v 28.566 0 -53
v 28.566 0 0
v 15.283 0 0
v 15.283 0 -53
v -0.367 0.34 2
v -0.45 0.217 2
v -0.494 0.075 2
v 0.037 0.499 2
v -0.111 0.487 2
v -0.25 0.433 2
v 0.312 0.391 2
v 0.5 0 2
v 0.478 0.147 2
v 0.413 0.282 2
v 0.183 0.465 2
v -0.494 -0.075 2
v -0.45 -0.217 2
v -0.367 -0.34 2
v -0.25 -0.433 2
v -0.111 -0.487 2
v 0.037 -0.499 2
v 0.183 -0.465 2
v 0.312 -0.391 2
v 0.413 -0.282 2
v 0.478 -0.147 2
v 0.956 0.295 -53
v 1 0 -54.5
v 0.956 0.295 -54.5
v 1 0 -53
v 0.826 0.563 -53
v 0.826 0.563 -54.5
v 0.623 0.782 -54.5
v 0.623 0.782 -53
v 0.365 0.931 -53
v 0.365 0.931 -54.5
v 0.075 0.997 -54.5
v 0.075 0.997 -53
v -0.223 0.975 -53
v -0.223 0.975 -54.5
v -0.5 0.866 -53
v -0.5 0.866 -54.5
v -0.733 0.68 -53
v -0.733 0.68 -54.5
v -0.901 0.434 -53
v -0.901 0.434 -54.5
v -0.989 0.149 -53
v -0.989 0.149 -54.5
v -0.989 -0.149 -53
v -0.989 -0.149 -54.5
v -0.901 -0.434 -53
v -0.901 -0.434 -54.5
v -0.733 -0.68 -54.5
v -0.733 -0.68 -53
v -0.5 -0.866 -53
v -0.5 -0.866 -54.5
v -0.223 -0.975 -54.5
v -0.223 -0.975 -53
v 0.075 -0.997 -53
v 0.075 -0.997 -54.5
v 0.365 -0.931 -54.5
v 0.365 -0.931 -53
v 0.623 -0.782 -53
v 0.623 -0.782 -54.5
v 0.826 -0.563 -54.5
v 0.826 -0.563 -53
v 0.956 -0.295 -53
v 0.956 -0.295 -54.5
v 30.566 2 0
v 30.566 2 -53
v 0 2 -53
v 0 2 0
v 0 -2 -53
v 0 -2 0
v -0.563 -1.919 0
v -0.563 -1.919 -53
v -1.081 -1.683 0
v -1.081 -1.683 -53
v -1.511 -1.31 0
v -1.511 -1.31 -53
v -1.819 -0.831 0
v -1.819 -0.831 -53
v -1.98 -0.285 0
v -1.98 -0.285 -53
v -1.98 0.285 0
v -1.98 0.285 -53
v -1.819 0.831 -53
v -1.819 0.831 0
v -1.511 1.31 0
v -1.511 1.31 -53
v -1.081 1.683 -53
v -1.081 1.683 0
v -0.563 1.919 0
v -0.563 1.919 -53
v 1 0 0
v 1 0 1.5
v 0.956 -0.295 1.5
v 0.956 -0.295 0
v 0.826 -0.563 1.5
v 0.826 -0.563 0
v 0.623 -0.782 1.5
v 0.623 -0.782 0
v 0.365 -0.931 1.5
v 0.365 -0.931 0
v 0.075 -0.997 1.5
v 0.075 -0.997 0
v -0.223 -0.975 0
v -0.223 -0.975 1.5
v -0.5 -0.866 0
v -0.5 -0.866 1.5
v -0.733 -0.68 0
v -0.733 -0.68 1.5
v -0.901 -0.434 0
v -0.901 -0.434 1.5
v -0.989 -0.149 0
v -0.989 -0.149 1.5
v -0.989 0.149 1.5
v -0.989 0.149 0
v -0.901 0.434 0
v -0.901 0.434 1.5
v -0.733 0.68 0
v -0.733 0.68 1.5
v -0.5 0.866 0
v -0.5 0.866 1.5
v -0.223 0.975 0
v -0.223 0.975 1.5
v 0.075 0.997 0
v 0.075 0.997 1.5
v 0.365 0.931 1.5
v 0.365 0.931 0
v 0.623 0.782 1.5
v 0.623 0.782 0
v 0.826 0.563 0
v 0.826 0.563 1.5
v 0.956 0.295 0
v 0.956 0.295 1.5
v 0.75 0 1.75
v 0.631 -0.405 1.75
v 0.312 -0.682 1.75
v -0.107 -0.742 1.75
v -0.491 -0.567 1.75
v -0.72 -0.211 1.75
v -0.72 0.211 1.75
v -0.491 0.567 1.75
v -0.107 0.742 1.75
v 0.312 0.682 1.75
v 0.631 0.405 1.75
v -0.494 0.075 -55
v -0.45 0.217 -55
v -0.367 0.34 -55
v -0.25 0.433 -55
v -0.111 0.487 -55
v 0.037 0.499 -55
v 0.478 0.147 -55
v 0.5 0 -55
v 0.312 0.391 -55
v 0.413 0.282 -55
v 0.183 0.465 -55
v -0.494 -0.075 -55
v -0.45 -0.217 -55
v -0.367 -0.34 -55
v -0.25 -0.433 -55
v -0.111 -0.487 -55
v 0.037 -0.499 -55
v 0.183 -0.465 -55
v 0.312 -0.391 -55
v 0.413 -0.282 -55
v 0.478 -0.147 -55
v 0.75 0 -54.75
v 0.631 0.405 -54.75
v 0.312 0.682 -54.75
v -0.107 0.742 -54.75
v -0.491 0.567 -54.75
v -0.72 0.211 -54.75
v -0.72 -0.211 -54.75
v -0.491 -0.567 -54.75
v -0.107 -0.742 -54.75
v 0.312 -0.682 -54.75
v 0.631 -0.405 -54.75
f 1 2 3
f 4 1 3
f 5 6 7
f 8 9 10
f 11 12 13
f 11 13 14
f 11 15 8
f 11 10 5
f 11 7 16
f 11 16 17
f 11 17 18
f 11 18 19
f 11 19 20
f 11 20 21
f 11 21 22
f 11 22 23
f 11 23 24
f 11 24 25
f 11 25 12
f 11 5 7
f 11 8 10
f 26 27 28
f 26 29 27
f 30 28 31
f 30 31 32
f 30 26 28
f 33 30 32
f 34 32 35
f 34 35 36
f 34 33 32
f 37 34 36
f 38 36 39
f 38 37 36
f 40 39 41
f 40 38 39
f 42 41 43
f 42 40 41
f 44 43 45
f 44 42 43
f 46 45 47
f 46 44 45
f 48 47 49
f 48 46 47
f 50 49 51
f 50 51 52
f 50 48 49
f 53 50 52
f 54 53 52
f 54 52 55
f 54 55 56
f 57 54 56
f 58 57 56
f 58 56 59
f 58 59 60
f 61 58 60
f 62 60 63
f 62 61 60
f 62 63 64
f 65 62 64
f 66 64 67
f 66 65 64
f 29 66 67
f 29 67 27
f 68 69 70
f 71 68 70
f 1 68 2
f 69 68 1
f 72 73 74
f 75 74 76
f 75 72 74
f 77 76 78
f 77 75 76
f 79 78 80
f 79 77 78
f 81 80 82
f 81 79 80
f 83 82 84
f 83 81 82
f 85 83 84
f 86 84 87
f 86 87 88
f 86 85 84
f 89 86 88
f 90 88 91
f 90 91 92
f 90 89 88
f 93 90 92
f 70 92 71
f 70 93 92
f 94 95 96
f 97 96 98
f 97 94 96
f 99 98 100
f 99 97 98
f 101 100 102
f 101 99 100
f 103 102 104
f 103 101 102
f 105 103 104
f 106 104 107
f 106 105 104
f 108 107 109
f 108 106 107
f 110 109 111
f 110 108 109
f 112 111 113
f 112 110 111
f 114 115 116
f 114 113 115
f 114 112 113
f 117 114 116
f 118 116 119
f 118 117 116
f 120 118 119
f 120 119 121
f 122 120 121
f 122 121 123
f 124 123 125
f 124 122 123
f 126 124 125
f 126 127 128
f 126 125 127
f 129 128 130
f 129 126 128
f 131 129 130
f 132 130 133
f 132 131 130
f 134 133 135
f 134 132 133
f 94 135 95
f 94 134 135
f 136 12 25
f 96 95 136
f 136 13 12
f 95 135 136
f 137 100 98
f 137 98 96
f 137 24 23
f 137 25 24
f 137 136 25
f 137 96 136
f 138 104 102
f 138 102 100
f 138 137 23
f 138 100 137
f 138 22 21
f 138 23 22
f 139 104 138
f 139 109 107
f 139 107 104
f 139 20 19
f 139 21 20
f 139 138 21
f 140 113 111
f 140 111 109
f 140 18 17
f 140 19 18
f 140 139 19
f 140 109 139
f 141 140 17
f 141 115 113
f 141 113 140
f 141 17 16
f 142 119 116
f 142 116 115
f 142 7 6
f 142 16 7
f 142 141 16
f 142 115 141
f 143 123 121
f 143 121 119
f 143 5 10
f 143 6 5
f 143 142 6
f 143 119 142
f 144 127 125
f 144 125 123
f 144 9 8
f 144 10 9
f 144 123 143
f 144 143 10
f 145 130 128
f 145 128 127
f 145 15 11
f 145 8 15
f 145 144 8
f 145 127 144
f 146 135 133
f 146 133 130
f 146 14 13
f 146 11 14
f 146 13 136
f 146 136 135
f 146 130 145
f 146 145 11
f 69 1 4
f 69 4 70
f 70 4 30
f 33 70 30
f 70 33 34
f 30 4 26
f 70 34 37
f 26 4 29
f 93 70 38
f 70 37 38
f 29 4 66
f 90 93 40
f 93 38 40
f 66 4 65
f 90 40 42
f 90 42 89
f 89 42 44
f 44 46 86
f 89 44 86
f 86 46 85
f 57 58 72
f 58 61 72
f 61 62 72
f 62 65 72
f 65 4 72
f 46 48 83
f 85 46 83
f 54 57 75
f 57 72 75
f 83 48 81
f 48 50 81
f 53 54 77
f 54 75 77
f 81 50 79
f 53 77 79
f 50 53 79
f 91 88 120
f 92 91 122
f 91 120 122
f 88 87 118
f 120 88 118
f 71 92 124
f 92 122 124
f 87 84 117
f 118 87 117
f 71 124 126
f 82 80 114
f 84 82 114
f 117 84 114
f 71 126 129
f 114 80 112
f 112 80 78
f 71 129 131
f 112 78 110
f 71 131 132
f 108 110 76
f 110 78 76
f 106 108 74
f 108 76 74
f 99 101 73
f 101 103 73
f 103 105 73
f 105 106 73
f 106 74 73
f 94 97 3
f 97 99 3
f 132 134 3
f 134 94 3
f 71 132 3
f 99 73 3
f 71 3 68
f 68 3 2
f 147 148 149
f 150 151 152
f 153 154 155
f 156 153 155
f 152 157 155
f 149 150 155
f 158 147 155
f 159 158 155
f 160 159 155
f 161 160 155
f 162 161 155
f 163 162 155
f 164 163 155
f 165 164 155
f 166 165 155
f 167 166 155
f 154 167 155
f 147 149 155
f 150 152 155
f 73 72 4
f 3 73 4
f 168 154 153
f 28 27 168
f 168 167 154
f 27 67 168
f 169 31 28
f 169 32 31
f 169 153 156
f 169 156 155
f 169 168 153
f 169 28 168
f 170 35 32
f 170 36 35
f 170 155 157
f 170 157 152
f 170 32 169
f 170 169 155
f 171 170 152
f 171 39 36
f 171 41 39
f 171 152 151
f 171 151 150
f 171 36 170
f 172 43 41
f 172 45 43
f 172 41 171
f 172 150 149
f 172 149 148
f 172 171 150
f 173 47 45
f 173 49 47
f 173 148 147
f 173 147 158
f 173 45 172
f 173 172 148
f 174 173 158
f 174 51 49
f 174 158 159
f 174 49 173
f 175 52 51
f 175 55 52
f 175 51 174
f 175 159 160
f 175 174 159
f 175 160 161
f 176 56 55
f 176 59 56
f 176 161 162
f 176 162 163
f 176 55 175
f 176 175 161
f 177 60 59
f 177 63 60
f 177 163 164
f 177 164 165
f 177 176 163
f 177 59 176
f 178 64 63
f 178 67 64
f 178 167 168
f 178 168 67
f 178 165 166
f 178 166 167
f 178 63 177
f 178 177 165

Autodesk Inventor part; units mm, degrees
ref_plane "YZ Plane" through (0, 0, 0) normal (1, 0, 0) x (0, 1, 0)
ref_plane "XZ Plane" through (0, 0, 0) normal (0, 1, 0) x (-1, 0, 0)
ref_plane "XY Plane" through (0, 0, 0) normal (0, 0, 1) x (1, 0, 0)
sketch "Sketch1" plane through (0, 0, 0) normal (0, 1, 0) x (-1, 0, 0)
  line L0 (0, 0) -> (-30.566, 0)
  line L1 (-30.566, 0) -> (-30.566, -53)
  line L2 (-30.566, -53) -> (0, -53)
  line L3 (0, -53) -> (0, 0)
  dimension "d0" = 30.566
  dimension "d1" = 53
extrude "Extrusion1" add sketch "Sketch1" along normal blind 2
ref_plane "Work Plane1" through (30.566, 0, -23) normal (0, 0, -1) x (-1, 0, 0)
sketch "Sketch2" plane through (30.566, 0, -23) normal (0, 0, -1) x (-1, 0, 0)
  point P0 (30.566, 0)
sketch "Sketch3" plane through (30.566, 0, -53) normal (0, 0, -1) x (-1, 0, 0)
  circle A0 centre (30.566, 0) radius 1
  circle A1 centre (30.566, 0) radius 2
  line L0 (30.566, -2) -> (15.283, 0)
  line L1 (15.283, 0) -> (28.566, 0)
  line L2 (0, 0) -> (30.566, 0) projected
  dimension "d5" = 2
  dimension "d6" = 4
extrude "Extrusion2" add sketch "Sketch3" against normal blind 53 contours A1 L0 | A1 L0 L1 picked at (30.3543, -1.6418)
sketch "Sketch4" plane through (30.566, 0, -53) normal (0, 0, -1) x (-1, 0, 0)
  arc A0 (29.566, 0) -> (30.566, 1) centre (30.566, 0) ccw projected
  circle A1 centre (30.566, 0) radius 1
  point P0 (30.566, 1)
extrude "Extrusion3" cut sketch "Sketch4" against normal blind 53
chamfer "Chamfer2" distance 2 angle 45 1 edges at (30.566, 0, -26.5)
sketch "Sketch5" plane through (0, 0, 0) normal (0, 0, 1) x (1, 0, 0)
  circle A0 centre (0, 0) radius 1
extrude "Extrusion4" add sketch "Sketch5" along normal blind 2 and the other way blind 55
chamfer "Chamfer3" distance 0.5 angle 45 1 edges at (-1, 0, 2)
chamfer "Chamfer4" distance 0.5 angle 45 1 edges at (-1, 0, -55)
equation "\"BendRadius\" = Thickness"
equation "\"BendReliefWidth\" = Thickness"
equation "\"BendReliefDepth\" = 0.5 * Thickness"
equation "\"CornerReliefSize\" = 4 * Thickness"
equation "\"MinimumRemnant\" = 2 * Thickness"
equation "\"TransitionRadius\" = BendRadius"
equation "\"JacobiRadiusSize\" = BendRadius"
equation "\"GapSize\" = Thickness"
equation "\"Thickness\" = 0.5"
properties part number "Part7v2"
